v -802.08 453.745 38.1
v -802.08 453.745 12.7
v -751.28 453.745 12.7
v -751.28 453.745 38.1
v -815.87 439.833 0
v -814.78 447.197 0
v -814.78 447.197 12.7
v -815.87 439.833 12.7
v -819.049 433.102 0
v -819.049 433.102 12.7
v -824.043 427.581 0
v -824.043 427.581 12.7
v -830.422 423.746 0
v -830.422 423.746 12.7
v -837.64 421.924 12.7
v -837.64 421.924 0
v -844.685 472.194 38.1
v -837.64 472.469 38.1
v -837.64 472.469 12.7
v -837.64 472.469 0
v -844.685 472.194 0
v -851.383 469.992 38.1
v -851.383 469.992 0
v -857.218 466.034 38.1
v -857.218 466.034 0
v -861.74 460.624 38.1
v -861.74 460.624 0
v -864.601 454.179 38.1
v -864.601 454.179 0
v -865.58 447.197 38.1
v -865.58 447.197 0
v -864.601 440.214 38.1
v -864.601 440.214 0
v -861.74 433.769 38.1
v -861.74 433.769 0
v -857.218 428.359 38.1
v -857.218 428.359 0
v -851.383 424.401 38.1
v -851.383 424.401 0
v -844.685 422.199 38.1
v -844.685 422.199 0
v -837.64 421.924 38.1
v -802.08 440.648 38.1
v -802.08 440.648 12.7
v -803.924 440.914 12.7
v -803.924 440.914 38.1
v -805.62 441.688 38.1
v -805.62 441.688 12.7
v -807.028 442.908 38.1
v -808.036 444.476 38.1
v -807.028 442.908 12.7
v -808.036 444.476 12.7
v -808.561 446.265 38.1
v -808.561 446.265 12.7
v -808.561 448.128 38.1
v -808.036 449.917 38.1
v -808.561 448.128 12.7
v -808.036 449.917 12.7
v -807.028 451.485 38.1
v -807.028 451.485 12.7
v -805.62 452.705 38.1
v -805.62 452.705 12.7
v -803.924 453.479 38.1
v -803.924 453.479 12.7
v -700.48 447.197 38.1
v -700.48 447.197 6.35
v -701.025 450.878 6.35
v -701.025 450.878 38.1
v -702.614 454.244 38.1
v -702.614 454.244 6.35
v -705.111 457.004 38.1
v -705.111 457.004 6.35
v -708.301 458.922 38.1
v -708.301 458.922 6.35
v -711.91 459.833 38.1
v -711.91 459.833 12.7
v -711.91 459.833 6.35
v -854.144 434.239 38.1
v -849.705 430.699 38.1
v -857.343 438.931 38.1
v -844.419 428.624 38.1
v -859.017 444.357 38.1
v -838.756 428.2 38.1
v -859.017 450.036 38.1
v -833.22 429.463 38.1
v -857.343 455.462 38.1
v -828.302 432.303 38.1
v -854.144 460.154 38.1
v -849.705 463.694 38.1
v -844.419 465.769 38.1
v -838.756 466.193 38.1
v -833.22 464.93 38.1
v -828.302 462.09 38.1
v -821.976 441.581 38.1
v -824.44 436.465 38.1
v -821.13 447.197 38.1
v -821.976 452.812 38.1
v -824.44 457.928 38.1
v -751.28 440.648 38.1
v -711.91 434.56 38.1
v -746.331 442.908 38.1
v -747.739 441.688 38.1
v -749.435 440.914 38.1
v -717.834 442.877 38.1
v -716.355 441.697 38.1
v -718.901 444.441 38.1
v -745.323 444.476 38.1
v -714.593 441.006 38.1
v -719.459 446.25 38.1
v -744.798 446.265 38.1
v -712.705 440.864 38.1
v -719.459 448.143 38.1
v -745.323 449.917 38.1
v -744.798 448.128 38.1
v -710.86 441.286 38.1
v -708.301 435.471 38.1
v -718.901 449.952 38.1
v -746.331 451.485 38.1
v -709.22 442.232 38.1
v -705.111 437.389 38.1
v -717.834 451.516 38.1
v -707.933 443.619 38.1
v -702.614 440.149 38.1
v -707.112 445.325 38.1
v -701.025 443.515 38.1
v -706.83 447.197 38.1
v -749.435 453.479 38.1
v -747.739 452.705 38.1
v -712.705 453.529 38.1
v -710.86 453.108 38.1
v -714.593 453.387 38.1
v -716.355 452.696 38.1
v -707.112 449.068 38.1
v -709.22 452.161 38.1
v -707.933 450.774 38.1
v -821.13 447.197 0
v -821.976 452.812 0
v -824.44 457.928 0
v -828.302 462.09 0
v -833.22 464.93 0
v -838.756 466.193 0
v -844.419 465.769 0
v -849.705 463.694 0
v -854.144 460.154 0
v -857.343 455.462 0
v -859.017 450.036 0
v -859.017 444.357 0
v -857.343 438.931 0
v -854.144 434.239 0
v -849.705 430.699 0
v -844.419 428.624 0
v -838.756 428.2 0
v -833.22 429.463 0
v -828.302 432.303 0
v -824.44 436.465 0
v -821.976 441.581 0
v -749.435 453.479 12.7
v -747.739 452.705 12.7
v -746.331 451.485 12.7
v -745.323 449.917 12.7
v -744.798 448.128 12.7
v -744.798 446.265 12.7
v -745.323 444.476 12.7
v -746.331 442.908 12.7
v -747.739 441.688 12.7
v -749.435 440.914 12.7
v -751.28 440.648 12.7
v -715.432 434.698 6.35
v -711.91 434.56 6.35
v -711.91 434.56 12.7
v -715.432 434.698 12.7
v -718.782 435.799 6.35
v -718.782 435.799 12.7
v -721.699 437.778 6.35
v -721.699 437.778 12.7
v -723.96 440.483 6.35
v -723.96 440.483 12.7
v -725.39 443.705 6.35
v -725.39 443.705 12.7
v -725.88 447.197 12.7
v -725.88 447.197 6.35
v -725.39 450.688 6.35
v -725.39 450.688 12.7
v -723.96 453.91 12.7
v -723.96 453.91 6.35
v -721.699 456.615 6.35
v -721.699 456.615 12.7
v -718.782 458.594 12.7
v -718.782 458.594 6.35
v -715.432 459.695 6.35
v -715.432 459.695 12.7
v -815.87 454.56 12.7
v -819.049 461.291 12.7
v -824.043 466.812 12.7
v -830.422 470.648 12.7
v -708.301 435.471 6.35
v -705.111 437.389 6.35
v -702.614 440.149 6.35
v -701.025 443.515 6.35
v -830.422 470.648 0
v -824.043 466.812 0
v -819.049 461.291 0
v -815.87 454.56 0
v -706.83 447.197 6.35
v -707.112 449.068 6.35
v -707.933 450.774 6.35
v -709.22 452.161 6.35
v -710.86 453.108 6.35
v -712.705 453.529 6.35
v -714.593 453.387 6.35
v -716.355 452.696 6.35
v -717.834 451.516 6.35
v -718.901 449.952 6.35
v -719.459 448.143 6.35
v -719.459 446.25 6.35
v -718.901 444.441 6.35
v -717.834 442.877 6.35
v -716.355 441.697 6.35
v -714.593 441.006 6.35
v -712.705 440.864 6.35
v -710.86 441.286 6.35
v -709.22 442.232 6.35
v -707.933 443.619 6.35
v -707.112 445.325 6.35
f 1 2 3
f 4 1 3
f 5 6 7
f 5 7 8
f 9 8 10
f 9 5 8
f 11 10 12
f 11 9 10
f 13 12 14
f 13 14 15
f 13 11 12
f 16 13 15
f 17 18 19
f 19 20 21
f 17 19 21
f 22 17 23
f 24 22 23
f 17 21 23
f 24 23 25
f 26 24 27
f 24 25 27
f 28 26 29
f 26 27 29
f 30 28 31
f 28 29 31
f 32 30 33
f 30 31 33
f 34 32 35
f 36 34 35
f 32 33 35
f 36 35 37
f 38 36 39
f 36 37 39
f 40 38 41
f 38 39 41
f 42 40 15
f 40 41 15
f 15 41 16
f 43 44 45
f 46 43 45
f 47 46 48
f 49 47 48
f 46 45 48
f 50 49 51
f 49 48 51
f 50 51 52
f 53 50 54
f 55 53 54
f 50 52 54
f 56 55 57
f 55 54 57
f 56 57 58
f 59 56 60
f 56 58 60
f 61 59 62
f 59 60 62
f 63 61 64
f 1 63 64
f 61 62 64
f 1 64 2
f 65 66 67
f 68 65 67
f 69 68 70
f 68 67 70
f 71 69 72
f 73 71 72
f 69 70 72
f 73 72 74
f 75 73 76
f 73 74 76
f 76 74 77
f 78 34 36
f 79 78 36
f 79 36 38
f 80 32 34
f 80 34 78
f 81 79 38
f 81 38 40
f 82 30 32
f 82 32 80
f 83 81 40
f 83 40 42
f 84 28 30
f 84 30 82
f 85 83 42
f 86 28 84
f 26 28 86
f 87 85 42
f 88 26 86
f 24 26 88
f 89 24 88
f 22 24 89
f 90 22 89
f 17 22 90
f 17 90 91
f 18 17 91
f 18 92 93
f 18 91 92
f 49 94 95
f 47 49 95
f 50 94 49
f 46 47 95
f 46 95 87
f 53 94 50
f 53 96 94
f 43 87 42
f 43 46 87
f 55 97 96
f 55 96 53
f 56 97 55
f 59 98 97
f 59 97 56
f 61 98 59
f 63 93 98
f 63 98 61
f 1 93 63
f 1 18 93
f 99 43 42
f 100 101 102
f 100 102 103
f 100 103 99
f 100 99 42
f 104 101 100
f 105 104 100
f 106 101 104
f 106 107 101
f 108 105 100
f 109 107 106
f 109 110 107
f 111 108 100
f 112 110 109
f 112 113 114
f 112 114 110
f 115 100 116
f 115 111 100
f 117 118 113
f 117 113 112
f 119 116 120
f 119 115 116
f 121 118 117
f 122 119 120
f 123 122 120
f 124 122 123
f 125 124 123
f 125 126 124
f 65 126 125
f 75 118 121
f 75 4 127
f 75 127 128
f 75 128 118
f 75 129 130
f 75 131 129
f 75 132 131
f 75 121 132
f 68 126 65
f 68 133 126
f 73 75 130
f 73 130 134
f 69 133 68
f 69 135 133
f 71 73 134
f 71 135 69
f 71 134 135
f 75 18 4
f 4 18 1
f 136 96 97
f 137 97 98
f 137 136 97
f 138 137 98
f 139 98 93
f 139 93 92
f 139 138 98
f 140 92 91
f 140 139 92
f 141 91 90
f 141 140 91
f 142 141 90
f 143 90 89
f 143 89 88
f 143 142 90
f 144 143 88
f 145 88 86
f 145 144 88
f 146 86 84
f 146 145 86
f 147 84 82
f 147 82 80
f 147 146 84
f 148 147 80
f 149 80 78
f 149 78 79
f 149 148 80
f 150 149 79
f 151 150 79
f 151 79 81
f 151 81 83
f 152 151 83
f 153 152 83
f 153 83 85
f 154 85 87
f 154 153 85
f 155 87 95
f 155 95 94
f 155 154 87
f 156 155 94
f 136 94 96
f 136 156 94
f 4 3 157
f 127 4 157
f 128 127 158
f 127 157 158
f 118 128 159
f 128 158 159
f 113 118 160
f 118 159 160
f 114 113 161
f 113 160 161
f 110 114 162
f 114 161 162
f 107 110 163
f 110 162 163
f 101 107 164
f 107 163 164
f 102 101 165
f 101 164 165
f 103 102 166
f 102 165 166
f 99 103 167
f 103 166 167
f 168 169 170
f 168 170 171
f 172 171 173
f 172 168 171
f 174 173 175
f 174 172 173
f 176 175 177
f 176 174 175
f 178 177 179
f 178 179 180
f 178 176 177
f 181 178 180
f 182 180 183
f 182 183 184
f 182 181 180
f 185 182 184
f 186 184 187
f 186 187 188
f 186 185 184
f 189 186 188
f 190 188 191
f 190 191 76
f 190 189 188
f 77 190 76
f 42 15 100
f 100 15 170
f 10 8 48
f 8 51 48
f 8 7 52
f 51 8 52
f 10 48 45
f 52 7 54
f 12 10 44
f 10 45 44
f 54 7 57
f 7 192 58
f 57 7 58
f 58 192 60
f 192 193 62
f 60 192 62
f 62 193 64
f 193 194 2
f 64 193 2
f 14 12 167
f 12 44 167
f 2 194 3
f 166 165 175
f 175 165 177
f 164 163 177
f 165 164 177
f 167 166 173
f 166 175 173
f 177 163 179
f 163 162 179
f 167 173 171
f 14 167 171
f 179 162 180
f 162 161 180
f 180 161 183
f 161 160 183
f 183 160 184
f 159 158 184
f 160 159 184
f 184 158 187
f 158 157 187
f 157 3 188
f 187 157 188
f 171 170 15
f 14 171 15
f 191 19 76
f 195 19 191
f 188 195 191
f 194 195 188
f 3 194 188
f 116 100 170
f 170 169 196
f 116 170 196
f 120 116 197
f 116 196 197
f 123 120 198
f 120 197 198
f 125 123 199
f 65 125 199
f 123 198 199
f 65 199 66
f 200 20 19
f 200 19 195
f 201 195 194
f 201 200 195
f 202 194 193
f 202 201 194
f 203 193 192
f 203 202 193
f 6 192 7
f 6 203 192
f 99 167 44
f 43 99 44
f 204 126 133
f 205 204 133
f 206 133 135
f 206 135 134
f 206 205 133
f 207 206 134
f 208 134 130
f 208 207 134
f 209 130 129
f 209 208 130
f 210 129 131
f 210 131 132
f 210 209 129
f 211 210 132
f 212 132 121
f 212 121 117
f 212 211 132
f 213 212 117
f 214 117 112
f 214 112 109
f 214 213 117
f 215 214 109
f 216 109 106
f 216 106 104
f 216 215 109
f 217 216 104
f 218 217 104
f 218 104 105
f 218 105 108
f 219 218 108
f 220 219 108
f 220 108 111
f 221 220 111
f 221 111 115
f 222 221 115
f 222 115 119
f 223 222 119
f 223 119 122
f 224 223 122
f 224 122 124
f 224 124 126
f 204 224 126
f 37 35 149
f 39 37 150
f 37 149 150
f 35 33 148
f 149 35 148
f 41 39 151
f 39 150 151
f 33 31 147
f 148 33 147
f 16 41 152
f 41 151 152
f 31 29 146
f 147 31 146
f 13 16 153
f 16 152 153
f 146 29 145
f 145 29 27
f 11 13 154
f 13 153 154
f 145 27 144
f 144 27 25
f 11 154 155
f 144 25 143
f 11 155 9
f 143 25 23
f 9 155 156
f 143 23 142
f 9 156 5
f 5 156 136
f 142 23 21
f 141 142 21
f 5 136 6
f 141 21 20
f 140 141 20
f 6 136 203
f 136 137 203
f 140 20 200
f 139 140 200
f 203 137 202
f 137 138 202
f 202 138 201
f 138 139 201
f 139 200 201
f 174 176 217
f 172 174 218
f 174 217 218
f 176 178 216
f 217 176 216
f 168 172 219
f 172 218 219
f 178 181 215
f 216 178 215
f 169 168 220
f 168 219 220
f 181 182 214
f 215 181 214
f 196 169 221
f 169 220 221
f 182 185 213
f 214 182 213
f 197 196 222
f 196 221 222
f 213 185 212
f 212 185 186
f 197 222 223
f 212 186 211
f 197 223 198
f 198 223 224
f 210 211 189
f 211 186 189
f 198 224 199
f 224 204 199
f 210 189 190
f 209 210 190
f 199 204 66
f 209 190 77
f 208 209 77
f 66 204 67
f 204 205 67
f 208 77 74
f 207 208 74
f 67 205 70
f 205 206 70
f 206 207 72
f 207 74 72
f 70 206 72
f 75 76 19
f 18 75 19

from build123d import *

# Parameters (mm, degrees)
F0_R     = 19.05
F0_R_2   = 6.35
F1_DEPTH = 38.1
F2_DEPTH = 12.7
F3_DEPTH = 6.35


with BuildPart() as f1:
    # F0 (on Top) → F1 (new body)
    with BuildSketch(Plane.XY):
        with BuildLine():
            ThreePointArc((-837.6395976841, 421.923872186), (-821.3424535269, 430.1577150999), (-814.7795976841, 447.1965530885))
            ThreePointArc((-814.7795976841, 447.1965530885), (-821.3424535269, 464.235391077), (-837.6395976841, 472.469233991))
            ThreePointArc((-837.6395976841, 472.469233991), (-865.5795976841, 447.1965530885), (-837.6395976841, 421.923872186))
        make_face()
        with Locations((-840.1795976841, 447.1965530885)):
            Circle(F0_R, mode=Mode.SUBTRACT)
        with BuildLine():
            ThreePointArc((-837.6395976841, 472.469233991), (-821.3424535269, 464.235391077), (-814.7795976841, 447.1965530885))
            ThreePointArc((-814.7795976841, 447.1965530885), (-821.3424535269, 430.1577150999), (-837.6395976841, 421.923872186))
            Line((-837.6395976841, 421.923872186), (-711.9095976841, 434.5602126372))
            ThreePointArc((-711.9095976841, 434.5602126372), (-725.8795976841, 447.1965530885), (-711.9095976841, 459.8328935397))
            Line((-711.9095976841, 459.8328935397), (-837.6395976841, 472.469233991))
        make_face()
        with BuildLine():
            ThreePointArc((-802.0795976841, 440.6483835481), (-808.6277672246, 447.1965530885), (-802.0795976841, 453.7447226289))
            Line((-802.0795976841, 453.7447226289), (-751.2795976841, 453.7447226289))
            ThreePointArc((-751.2795976841, 453.7447226289), (-744.7314281437, 447.1965530885), (-751.2795976841, 440.6483835481))
            Line((-751.2795976841, 440.6483835481), (-802.0795976841, 440.6483835481))
        make_face(mode=Mode.SUBTRACT)
        with BuildLine():
            ThreePointArc((-700.4795976841, 447.1965530885), (-703.7610256055, 455.7159720828), (-711.9095976841, 459.8328935397))
            ThreePointArc((-711.9095976841, 459.8328935397), (-725.8795976841, 447.1965530885), (-711.9095976841, 434.5602126372))
            ThreePointArc((-711.9095976841, 434.5602126372), (-703.7610256055, 438.6771340942), (-700.4795976841, 447.1965530885))
        make_face()
        with Locations((-713.1795976841, 447.1965530885)):
            Circle(F0_R_2, mode=Mode.SUBTRACT)
    extrude(amount=F1_DEPTH)

    # F0 (on Top) → F2 (cut)
    with BuildSketch(Plane.XY):
        with BuildLine():
            ThreePointArc((-837.6395976841, 472.469233991), (-821.3424535269, 464.235391077), (-814.7795976841, 447.1965530885))
            ThreePointArc((-814.7795976841, 447.1965530885), (-821.3424535269, 430.1577150999), (-837.6395976841, 421.923872186))
            Line((-837.6395976841, 421.923872186), (-711.9095976841, 434.5602126372))
            ThreePointArc((-711.9095976841, 434.5602126372), (-725.8795976841, 447.1965530885), (-711.9095976841, 459.8328935397))
            Line((-711.9095976841, 459.8328935397), (-837.6395976841, 472.469233991))
        make_face()
        with BuildLine():
            ThreePointArc((-802.0795976841, 440.6483835481), (-808.6277672246, 447.1965530885), (-802.0795976841, 453.7447226289))
            Line((-802.0795976841, 453.7447226289), (-751.2795976841, 453.7447226289))
            ThreePointArc((-751.2795976841, 453.7447226289), (-744.7314281437, 447.1965530885), (-751.2795976841, 440.6483835481))
            Line((-751.2795976841, 440.6483835481), (-802.0795976841, 440.6483835481))
        make_face(mode=Mode.SUBTRACT)
    extrude(amount=F2_DEPTH, mode=Mode.SUBTRACT)

    # F3 (cut): a face of the model
    f3_faces = [f1.faces().sort_by_distance(p)[0] for p in [
        (-714.4136766597, 459.4754838588, 0),
    ]]
    extrude(f3_faces, amount=-F3_DEPTH, mode=Mode.SUBTRACT)


solid = f1.part
